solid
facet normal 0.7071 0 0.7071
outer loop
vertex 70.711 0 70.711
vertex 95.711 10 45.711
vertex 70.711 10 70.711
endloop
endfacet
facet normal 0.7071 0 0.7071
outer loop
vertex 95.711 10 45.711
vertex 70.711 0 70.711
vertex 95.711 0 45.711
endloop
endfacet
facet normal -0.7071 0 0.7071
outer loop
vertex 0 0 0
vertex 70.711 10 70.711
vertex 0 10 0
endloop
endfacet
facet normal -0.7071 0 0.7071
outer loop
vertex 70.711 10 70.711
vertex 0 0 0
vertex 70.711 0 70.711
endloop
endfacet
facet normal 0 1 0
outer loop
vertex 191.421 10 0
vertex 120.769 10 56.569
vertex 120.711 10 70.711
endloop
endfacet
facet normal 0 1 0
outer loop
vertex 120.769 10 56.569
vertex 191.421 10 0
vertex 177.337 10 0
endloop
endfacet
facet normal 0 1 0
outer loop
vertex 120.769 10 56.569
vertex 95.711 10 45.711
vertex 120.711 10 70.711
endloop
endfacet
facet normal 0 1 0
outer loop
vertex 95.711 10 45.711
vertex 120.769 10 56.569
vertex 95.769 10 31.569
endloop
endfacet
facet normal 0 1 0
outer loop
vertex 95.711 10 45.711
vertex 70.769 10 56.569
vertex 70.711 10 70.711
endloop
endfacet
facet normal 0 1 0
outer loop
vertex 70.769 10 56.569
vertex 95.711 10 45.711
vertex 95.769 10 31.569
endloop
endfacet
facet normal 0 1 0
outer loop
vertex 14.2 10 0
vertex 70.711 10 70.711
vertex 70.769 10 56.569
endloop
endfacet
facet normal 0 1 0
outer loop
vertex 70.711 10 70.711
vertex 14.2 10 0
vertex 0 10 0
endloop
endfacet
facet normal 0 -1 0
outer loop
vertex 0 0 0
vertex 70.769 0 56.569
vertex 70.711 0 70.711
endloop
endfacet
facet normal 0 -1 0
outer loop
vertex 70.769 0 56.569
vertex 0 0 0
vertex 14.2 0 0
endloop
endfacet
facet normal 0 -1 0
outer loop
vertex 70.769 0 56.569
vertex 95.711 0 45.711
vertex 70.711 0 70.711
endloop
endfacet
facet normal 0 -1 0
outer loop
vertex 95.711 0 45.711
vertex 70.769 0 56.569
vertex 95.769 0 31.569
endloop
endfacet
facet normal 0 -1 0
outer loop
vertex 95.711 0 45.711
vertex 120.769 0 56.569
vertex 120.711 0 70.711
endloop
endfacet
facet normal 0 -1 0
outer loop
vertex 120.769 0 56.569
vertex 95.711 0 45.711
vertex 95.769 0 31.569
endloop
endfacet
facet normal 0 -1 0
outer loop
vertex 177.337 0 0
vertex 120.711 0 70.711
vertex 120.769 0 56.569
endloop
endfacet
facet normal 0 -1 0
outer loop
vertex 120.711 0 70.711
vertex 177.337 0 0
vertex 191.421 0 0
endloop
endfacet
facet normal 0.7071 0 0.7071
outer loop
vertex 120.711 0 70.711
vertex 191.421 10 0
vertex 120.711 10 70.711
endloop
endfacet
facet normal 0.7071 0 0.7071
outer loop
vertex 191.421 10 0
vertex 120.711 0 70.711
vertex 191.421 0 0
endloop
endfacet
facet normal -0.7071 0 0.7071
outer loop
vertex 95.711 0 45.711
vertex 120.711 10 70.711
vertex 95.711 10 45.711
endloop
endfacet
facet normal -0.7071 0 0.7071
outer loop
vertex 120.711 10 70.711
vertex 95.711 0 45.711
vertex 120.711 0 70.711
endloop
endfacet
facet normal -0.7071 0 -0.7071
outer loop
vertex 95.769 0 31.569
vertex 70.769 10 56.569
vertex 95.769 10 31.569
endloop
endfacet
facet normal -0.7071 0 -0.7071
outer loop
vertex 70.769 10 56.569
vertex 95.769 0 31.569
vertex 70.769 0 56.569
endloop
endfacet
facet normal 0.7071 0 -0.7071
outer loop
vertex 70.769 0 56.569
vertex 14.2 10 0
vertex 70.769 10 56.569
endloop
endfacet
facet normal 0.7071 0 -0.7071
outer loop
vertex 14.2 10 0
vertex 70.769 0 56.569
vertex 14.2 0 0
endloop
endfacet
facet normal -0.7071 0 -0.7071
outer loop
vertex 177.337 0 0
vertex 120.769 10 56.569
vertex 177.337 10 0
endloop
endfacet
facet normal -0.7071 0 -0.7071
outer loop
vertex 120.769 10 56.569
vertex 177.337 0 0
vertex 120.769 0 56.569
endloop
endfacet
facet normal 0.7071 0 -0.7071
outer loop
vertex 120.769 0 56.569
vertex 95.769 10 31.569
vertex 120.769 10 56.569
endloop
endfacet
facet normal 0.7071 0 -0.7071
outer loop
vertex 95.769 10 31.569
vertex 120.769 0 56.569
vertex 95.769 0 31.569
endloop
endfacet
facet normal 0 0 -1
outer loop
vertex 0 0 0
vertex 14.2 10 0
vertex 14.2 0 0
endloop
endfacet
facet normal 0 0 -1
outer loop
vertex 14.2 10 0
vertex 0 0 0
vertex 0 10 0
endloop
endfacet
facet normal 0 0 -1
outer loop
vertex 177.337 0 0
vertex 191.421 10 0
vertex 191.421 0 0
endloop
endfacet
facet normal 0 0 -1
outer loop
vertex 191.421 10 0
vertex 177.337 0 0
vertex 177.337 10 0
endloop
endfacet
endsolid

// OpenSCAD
difference() {
    union() {
        rotate([0,45,0]) cube([100,10,100]);
        translate([50,0,0]) rotate([0,45,0]) cube([100,10,100]);
    }
    union() {
        translate([14.2,0,0]) rotate([0,45,0]) cube([80,10,80]);
        translate([64.2,0,0]) rotate([0,45,0]) cube([80,10,80]);
        translate([0,0,-100]) cube([200,10,100]);
    }

}
